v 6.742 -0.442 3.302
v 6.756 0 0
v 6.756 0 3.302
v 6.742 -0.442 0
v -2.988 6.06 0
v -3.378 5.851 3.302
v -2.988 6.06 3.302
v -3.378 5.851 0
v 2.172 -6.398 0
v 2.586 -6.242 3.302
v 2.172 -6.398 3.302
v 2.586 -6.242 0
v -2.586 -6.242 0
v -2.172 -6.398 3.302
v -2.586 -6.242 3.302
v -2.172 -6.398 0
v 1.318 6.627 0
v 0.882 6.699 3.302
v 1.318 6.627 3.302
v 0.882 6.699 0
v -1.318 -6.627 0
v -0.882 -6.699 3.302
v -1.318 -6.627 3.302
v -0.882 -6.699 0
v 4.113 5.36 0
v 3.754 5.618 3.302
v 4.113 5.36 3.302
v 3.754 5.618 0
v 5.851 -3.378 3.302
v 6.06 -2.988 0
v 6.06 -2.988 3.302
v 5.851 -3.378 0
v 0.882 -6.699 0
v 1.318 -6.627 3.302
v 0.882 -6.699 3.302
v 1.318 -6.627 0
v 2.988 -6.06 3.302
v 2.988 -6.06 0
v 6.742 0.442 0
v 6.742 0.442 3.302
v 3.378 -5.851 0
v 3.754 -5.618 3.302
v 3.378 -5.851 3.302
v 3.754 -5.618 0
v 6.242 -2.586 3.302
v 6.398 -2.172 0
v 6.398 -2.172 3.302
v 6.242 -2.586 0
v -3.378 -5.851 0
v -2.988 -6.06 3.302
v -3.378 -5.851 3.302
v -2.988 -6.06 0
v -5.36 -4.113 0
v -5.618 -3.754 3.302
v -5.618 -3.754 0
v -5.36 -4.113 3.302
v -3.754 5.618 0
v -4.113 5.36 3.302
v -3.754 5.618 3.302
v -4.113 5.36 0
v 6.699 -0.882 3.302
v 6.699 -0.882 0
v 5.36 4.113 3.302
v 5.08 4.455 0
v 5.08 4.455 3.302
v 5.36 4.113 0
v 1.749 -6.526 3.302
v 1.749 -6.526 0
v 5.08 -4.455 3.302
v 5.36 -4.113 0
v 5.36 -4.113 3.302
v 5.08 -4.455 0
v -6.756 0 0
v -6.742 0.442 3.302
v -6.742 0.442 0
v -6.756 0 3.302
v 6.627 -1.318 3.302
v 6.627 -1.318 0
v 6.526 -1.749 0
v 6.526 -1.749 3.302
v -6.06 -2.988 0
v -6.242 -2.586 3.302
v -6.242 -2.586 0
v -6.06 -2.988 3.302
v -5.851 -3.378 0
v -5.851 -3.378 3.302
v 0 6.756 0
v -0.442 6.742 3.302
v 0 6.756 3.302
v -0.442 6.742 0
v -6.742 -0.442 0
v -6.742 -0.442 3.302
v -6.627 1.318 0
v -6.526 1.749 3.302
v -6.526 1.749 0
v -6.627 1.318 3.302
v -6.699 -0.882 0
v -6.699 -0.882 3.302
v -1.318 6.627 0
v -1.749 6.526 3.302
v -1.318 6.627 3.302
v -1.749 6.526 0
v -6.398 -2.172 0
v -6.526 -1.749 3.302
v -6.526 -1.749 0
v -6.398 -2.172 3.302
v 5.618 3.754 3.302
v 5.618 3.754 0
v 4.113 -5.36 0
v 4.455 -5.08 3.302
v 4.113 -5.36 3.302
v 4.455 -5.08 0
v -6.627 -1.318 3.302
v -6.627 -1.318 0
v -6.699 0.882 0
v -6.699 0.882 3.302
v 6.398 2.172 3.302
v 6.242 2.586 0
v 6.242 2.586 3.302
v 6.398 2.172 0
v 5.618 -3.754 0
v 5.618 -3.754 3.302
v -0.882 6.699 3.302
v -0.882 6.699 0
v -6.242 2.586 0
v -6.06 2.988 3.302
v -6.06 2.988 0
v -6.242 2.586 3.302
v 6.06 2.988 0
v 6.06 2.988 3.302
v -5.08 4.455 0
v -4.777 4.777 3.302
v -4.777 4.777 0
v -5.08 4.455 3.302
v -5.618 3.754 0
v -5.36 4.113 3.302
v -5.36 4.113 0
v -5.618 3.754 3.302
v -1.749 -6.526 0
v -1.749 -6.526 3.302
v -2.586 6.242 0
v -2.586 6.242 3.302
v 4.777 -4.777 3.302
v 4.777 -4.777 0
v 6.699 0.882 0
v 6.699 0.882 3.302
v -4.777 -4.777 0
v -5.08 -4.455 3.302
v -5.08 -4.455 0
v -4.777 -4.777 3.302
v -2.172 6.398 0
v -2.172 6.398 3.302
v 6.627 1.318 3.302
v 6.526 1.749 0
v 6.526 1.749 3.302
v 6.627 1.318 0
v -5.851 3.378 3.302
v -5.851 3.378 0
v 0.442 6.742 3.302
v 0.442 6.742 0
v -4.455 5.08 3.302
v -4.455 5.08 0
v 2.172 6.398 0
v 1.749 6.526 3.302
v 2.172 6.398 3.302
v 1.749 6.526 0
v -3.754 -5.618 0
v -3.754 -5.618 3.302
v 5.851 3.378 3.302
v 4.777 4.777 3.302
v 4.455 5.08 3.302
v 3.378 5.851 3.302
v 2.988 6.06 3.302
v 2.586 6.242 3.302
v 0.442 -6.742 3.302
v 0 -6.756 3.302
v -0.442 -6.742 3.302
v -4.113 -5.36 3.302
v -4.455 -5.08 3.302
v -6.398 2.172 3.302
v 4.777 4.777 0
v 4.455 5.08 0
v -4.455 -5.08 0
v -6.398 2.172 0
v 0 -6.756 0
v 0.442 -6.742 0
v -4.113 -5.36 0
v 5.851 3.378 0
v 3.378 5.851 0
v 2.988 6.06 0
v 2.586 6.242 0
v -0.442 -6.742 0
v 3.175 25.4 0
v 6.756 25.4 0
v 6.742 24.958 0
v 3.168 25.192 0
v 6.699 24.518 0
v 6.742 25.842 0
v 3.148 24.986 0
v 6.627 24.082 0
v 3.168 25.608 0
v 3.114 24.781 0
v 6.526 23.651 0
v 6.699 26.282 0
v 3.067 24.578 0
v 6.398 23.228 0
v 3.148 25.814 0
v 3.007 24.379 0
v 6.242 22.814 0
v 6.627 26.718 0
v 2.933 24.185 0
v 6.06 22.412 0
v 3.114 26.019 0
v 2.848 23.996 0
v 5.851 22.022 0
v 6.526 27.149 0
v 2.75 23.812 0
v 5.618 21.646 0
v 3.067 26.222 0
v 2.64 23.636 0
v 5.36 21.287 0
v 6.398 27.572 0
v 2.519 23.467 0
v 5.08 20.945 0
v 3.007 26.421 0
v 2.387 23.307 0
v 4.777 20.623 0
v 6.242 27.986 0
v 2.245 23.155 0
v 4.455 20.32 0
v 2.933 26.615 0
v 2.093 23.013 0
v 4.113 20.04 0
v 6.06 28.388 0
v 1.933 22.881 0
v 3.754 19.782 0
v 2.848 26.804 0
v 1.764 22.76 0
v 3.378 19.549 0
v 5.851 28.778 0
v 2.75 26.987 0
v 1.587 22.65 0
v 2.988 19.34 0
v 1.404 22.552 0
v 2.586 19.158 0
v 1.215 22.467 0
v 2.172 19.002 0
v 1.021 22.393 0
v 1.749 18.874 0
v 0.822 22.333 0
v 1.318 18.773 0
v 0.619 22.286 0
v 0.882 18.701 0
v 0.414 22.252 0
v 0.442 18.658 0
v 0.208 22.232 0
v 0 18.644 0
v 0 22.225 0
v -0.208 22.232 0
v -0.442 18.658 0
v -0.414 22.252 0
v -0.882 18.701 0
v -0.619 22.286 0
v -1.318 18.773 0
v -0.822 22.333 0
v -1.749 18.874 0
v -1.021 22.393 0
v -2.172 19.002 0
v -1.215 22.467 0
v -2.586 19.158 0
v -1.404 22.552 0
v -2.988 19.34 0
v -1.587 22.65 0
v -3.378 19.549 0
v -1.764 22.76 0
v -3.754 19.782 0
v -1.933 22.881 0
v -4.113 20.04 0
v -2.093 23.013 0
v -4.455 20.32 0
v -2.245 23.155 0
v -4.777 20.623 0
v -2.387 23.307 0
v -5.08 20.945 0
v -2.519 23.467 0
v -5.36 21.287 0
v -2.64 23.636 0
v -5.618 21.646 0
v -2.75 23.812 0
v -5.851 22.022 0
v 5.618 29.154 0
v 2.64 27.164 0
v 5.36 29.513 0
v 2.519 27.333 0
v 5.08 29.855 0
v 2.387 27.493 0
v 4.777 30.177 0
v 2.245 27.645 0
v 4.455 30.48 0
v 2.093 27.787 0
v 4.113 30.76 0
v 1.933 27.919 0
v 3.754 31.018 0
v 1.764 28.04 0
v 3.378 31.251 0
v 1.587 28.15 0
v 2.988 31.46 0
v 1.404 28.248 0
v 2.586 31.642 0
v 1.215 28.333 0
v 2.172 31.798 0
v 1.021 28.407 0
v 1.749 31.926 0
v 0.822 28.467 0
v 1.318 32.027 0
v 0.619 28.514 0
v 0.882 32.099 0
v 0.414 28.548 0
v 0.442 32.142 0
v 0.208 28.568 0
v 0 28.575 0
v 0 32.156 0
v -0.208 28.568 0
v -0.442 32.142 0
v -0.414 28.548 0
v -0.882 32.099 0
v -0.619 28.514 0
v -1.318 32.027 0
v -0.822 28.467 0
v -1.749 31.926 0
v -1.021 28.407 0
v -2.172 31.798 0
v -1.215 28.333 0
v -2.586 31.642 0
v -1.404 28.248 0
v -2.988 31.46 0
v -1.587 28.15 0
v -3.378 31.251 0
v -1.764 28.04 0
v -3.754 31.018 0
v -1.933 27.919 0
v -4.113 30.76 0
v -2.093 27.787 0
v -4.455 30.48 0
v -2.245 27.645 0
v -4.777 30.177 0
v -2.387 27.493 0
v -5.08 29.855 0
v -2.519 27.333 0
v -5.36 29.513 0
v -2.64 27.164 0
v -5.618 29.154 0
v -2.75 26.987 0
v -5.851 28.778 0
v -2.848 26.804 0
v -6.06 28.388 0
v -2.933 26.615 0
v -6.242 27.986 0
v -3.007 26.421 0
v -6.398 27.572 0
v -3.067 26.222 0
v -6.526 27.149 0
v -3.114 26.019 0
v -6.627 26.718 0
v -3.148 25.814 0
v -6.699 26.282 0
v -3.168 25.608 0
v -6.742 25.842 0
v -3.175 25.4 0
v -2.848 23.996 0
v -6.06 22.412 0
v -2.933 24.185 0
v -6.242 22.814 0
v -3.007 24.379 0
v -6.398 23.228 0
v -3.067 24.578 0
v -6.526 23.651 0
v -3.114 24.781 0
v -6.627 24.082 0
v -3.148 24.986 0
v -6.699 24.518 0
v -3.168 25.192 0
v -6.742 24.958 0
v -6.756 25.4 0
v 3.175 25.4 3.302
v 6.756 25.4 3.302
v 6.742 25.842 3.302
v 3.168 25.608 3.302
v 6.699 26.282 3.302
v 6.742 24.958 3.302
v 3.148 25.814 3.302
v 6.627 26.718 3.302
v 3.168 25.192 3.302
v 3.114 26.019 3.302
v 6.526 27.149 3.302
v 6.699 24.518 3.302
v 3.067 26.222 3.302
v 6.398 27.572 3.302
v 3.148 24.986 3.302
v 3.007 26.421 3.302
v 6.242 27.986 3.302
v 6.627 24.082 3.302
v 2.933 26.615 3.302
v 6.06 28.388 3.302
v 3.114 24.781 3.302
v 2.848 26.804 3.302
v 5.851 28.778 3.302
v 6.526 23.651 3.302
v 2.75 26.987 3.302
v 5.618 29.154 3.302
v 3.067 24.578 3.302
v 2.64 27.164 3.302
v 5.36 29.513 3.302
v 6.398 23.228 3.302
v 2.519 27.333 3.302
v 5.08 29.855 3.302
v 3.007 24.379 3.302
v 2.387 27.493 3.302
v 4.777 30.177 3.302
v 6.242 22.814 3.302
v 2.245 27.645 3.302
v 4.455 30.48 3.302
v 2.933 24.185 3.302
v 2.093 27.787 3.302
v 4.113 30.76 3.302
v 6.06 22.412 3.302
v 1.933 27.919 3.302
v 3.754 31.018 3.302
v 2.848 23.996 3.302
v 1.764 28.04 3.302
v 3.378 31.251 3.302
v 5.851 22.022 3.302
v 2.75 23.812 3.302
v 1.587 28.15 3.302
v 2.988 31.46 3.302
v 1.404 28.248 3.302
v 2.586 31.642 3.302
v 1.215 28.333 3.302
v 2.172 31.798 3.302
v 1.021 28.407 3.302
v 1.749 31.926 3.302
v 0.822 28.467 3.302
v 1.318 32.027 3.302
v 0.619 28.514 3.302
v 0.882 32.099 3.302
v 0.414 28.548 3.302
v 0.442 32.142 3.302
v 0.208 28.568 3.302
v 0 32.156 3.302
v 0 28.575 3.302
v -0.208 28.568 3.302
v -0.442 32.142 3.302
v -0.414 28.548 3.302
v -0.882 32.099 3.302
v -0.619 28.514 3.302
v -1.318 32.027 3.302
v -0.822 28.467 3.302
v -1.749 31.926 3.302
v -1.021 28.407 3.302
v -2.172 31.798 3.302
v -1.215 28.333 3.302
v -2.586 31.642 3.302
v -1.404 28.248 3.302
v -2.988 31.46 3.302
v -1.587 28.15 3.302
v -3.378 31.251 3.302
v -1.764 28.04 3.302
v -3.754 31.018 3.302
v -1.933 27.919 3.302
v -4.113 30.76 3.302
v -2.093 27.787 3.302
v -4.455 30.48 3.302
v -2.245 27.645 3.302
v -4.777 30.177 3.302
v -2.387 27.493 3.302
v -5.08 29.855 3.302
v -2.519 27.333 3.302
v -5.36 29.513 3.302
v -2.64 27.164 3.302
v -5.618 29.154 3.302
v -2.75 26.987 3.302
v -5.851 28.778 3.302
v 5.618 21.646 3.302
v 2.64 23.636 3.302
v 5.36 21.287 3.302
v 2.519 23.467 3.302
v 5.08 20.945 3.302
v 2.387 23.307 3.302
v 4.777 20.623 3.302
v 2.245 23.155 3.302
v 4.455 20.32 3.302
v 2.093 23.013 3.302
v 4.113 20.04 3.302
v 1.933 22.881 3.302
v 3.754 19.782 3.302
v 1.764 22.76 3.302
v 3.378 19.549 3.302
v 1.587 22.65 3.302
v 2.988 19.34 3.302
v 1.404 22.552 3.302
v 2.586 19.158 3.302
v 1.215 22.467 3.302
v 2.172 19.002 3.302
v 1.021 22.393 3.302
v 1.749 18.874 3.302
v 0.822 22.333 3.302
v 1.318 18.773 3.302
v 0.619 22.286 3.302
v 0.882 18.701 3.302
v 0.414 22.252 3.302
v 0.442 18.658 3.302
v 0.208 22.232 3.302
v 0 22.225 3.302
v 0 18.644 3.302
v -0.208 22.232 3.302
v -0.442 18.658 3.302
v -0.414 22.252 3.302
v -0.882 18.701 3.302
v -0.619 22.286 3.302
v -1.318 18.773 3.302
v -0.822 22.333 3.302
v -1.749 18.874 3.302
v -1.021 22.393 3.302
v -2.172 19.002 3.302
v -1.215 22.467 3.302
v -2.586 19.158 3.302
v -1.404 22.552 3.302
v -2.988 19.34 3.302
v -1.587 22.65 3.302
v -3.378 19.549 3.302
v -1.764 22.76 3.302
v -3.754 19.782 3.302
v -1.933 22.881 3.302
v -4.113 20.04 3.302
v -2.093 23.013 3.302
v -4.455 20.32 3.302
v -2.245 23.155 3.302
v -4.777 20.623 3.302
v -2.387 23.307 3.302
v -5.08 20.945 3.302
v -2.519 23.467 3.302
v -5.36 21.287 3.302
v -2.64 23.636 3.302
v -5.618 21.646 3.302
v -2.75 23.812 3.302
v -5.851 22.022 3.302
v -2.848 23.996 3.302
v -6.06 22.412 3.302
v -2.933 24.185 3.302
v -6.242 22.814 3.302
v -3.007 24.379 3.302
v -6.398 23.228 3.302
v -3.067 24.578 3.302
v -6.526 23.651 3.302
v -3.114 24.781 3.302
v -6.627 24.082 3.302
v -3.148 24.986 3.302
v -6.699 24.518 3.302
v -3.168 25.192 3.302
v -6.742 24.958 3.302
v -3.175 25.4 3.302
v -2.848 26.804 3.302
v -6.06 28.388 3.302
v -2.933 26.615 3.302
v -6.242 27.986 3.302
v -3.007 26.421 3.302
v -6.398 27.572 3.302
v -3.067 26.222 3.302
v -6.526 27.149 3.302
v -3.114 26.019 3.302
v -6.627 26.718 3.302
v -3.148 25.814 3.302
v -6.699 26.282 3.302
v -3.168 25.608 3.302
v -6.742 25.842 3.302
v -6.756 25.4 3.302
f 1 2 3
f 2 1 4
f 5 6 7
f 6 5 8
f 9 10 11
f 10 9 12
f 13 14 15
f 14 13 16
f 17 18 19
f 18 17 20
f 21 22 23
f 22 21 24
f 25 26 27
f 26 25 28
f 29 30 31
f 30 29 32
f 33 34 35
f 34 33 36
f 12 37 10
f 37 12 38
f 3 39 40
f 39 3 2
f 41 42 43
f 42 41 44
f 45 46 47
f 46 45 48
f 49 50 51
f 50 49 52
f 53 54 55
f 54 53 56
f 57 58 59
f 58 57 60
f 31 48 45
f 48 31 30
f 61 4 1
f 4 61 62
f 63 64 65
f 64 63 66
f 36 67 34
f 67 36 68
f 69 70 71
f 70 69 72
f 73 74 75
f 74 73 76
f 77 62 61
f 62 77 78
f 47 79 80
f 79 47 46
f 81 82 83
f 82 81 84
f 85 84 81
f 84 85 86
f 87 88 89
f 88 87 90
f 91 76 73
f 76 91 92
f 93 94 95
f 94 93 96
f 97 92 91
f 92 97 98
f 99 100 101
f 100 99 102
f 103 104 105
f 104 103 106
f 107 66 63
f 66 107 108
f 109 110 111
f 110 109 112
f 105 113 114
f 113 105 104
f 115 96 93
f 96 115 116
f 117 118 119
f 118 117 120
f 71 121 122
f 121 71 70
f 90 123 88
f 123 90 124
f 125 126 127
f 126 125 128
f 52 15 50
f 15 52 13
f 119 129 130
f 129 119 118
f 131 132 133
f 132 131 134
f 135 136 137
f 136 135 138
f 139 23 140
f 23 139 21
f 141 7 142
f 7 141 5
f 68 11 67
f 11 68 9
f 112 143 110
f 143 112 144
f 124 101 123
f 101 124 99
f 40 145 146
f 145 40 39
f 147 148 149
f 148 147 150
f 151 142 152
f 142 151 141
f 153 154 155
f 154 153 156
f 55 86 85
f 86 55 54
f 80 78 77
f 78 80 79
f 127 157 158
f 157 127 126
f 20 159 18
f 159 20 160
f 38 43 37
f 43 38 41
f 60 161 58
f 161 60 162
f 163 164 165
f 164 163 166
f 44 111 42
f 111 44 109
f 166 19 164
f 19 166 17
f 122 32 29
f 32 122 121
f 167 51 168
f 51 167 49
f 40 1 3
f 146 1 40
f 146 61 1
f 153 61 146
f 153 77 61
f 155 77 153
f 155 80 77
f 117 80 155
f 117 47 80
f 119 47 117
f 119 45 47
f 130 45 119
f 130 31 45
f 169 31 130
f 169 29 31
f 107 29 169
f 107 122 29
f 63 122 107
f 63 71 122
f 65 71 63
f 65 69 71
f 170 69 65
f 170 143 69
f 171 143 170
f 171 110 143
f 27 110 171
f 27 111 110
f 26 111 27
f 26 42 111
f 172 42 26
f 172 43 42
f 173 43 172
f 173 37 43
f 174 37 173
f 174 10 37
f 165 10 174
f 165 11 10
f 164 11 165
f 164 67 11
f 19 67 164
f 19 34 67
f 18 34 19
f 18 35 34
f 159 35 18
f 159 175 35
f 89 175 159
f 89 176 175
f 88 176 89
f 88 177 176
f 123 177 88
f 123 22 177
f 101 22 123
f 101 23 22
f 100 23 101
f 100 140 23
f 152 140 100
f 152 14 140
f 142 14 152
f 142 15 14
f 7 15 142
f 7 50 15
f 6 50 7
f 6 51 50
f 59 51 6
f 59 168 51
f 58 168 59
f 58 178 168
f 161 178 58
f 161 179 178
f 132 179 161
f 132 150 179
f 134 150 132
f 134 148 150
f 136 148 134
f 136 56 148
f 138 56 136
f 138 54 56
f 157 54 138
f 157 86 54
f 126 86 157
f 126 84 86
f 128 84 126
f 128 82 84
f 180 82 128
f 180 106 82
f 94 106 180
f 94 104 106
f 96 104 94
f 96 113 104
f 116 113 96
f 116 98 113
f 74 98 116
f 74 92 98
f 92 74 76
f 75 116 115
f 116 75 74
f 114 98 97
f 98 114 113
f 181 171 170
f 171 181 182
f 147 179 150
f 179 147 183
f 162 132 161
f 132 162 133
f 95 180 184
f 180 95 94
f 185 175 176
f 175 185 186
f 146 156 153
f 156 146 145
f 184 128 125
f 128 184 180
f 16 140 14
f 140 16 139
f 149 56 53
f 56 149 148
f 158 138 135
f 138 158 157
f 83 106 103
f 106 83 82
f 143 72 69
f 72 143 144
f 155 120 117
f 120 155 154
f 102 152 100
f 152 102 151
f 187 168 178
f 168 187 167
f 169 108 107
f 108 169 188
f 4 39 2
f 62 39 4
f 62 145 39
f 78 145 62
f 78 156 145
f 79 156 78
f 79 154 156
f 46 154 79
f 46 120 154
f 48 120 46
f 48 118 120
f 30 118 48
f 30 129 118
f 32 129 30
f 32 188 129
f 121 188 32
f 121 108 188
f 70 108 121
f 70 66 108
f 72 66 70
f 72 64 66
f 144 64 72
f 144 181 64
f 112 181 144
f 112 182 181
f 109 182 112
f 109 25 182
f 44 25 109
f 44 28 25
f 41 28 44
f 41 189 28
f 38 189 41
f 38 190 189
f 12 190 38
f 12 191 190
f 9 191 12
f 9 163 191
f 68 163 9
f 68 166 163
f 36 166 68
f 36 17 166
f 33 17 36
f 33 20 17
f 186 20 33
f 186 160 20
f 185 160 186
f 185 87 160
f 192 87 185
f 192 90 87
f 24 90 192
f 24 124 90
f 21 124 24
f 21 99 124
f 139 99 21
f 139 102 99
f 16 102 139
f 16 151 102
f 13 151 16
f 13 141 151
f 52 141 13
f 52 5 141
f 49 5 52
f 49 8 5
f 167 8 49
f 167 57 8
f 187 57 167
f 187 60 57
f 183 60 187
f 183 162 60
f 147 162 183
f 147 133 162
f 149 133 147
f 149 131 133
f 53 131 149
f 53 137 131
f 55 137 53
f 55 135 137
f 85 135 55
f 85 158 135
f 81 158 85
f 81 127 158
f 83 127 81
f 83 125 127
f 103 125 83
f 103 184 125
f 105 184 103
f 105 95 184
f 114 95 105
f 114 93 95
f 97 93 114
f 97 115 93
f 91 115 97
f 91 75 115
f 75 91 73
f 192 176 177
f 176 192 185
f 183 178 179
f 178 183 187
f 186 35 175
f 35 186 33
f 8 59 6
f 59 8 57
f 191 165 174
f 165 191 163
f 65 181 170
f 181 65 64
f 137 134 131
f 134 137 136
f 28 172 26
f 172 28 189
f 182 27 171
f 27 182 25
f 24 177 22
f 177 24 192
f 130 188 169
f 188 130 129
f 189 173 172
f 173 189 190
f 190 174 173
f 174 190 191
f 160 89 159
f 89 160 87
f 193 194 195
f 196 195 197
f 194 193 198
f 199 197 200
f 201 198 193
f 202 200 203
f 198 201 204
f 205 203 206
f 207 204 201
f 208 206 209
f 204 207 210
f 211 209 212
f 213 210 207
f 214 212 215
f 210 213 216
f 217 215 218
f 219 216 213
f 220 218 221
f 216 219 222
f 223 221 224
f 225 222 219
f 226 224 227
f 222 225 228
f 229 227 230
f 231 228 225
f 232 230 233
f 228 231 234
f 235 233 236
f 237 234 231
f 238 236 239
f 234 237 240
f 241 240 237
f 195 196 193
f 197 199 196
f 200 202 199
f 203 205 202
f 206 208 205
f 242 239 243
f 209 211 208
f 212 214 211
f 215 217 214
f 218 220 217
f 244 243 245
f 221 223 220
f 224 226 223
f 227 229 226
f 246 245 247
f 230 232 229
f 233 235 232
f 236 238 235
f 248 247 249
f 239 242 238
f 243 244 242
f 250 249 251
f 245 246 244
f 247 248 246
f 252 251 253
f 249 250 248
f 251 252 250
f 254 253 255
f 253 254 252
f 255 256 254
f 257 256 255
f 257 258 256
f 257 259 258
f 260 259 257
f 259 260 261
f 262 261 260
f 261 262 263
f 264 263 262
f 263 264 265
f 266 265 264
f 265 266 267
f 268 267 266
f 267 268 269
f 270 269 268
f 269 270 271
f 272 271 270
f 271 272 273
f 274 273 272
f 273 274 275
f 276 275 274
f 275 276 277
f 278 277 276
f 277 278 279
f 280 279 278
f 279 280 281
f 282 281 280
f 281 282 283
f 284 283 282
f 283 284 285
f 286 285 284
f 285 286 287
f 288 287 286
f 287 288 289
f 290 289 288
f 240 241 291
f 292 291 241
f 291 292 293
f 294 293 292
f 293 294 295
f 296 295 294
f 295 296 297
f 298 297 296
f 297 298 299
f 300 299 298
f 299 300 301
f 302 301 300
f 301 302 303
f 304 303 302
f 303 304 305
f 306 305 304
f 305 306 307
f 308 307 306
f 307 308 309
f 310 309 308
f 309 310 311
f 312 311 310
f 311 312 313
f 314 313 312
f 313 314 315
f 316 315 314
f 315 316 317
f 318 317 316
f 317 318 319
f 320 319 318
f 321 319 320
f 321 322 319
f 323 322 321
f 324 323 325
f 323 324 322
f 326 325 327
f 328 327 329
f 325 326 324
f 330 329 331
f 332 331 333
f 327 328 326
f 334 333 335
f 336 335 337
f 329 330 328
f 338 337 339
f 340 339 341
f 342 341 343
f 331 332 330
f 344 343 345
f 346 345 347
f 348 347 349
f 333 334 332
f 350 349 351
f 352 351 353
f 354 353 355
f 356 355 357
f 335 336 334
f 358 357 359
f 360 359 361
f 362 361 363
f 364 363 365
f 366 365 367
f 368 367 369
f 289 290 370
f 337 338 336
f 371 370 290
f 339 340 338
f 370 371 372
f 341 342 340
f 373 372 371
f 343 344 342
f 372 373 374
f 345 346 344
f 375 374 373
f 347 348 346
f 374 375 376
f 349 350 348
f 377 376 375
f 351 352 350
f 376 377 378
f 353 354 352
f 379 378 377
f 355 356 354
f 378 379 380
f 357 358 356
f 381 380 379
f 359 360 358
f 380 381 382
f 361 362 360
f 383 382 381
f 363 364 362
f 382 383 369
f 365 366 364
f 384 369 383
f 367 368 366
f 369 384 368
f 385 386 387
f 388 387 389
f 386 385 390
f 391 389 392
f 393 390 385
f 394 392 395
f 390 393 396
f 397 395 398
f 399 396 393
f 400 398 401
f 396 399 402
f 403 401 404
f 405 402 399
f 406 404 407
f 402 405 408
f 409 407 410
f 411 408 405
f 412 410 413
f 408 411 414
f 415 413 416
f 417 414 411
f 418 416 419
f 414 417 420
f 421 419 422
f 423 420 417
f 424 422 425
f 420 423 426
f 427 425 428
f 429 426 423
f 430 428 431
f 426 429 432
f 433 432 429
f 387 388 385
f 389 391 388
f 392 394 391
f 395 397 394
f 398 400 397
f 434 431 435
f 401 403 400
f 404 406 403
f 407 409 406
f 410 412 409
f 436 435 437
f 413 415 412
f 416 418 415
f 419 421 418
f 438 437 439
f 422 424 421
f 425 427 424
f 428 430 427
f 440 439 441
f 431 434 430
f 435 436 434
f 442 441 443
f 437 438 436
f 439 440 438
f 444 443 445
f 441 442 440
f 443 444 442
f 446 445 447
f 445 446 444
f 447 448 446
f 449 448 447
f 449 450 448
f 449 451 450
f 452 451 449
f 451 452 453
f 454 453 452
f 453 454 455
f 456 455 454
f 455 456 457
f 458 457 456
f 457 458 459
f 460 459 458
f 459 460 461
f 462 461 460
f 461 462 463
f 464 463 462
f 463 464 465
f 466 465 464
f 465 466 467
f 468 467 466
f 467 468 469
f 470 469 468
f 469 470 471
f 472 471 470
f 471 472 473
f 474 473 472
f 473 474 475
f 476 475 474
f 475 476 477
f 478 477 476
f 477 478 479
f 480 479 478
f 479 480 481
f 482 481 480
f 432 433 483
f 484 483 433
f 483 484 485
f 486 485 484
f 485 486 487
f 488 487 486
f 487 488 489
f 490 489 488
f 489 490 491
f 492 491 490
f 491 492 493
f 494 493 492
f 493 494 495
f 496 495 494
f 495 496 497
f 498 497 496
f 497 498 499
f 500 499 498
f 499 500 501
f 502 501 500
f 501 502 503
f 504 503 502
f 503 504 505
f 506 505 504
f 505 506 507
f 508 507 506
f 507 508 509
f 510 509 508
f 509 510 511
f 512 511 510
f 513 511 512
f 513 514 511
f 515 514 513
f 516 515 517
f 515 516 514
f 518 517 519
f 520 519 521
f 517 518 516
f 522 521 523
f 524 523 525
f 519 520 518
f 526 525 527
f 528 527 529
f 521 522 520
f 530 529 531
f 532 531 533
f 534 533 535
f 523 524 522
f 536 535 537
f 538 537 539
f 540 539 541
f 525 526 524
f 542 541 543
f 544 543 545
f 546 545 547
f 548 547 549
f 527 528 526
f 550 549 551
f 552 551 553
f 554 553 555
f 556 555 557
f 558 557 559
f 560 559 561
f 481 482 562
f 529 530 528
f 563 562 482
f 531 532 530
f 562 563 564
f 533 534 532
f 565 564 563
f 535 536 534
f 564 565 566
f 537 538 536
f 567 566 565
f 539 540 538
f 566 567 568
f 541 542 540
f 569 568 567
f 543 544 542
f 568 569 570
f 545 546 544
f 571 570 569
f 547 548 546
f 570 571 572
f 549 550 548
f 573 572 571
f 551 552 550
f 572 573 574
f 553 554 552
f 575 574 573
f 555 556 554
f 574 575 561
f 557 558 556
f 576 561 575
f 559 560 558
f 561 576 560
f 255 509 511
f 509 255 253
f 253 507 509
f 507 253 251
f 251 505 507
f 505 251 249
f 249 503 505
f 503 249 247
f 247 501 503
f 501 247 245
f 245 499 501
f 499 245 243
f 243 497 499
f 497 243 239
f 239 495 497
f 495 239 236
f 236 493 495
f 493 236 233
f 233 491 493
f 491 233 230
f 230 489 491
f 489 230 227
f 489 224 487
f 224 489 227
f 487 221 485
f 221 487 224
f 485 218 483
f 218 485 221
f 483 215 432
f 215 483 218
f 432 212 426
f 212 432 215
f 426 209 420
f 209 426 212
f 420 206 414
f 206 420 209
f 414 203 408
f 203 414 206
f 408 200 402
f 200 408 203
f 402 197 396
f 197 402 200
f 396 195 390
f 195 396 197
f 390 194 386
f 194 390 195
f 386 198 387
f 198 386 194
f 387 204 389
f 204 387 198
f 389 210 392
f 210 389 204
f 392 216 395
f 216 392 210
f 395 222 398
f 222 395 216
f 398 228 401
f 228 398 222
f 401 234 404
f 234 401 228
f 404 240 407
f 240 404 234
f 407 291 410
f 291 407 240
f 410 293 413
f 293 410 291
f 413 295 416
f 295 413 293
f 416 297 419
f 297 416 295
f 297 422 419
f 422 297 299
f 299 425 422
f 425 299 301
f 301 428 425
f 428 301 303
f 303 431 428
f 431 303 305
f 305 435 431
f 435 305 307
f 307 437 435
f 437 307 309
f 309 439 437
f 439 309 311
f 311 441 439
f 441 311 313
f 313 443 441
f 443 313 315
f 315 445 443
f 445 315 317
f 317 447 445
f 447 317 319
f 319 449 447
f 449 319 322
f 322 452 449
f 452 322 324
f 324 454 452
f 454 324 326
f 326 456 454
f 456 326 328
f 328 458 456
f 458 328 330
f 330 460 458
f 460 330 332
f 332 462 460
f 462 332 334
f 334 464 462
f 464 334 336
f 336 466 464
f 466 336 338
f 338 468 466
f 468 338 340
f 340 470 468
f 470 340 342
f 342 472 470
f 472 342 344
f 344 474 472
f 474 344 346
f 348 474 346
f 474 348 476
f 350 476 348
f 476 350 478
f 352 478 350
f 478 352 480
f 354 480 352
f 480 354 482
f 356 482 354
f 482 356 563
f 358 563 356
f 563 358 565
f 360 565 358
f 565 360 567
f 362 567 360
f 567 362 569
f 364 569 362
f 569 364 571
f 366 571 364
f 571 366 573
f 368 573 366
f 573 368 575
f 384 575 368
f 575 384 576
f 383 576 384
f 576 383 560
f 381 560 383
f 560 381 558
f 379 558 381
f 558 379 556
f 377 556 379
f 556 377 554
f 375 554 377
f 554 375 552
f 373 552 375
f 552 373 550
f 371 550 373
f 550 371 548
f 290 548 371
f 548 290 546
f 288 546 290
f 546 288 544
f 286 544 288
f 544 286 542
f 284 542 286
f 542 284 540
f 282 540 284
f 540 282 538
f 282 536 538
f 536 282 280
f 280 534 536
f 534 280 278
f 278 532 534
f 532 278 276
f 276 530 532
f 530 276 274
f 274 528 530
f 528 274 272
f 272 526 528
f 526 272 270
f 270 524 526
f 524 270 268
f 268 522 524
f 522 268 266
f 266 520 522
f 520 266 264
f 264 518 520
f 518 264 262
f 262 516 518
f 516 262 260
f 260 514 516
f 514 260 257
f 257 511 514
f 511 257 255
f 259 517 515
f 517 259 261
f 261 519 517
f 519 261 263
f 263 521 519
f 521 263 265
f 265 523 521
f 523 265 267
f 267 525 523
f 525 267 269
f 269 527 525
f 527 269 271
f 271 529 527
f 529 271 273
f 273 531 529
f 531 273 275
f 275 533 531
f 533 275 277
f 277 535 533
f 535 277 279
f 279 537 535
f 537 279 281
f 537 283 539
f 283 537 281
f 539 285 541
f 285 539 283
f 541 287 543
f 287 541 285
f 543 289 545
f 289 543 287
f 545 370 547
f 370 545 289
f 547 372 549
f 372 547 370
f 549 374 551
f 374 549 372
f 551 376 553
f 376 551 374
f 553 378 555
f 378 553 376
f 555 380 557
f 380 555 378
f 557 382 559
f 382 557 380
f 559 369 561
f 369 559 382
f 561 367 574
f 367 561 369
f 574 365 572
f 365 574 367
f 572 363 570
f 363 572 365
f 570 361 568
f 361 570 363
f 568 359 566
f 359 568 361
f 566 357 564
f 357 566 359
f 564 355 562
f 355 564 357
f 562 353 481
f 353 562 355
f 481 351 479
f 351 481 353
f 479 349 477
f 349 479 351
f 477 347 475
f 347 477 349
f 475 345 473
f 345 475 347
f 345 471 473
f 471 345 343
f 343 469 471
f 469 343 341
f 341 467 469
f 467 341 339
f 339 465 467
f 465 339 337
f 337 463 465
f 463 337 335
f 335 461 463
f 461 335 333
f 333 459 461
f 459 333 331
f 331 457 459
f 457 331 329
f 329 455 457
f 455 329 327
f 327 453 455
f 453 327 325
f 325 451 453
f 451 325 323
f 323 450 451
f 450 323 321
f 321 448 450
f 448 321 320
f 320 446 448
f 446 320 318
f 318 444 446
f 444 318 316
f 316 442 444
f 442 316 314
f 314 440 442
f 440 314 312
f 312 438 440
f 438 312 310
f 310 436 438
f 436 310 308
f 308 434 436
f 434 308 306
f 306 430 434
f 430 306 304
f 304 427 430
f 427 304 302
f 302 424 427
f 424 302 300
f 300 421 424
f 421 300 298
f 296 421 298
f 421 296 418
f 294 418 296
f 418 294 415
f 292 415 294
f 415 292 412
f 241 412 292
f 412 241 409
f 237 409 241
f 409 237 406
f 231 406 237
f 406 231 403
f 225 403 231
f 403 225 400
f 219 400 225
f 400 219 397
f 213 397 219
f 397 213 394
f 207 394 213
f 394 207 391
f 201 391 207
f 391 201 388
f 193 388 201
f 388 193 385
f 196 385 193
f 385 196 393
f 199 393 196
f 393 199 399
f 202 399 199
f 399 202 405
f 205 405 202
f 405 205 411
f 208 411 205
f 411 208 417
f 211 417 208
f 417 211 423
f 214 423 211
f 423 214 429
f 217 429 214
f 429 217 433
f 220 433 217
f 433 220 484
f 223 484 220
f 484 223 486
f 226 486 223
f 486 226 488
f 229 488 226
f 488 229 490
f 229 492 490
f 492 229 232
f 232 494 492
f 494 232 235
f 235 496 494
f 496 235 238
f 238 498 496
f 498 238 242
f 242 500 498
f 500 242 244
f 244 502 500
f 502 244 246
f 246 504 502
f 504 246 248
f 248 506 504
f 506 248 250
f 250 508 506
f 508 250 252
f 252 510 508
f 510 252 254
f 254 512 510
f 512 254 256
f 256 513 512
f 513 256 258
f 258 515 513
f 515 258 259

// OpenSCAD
ViewScale = [0.0254, 0.0254, 0.0254];

scale(ViewScale)
{
    linear_extrude(130) circle(266, $fn=96);
    translate([0, 1000, 0])
    linear_extrude(130)
    difference()
    {
        circle(266, $fn=96);
        circle(125, $fn=96);
    }

}
